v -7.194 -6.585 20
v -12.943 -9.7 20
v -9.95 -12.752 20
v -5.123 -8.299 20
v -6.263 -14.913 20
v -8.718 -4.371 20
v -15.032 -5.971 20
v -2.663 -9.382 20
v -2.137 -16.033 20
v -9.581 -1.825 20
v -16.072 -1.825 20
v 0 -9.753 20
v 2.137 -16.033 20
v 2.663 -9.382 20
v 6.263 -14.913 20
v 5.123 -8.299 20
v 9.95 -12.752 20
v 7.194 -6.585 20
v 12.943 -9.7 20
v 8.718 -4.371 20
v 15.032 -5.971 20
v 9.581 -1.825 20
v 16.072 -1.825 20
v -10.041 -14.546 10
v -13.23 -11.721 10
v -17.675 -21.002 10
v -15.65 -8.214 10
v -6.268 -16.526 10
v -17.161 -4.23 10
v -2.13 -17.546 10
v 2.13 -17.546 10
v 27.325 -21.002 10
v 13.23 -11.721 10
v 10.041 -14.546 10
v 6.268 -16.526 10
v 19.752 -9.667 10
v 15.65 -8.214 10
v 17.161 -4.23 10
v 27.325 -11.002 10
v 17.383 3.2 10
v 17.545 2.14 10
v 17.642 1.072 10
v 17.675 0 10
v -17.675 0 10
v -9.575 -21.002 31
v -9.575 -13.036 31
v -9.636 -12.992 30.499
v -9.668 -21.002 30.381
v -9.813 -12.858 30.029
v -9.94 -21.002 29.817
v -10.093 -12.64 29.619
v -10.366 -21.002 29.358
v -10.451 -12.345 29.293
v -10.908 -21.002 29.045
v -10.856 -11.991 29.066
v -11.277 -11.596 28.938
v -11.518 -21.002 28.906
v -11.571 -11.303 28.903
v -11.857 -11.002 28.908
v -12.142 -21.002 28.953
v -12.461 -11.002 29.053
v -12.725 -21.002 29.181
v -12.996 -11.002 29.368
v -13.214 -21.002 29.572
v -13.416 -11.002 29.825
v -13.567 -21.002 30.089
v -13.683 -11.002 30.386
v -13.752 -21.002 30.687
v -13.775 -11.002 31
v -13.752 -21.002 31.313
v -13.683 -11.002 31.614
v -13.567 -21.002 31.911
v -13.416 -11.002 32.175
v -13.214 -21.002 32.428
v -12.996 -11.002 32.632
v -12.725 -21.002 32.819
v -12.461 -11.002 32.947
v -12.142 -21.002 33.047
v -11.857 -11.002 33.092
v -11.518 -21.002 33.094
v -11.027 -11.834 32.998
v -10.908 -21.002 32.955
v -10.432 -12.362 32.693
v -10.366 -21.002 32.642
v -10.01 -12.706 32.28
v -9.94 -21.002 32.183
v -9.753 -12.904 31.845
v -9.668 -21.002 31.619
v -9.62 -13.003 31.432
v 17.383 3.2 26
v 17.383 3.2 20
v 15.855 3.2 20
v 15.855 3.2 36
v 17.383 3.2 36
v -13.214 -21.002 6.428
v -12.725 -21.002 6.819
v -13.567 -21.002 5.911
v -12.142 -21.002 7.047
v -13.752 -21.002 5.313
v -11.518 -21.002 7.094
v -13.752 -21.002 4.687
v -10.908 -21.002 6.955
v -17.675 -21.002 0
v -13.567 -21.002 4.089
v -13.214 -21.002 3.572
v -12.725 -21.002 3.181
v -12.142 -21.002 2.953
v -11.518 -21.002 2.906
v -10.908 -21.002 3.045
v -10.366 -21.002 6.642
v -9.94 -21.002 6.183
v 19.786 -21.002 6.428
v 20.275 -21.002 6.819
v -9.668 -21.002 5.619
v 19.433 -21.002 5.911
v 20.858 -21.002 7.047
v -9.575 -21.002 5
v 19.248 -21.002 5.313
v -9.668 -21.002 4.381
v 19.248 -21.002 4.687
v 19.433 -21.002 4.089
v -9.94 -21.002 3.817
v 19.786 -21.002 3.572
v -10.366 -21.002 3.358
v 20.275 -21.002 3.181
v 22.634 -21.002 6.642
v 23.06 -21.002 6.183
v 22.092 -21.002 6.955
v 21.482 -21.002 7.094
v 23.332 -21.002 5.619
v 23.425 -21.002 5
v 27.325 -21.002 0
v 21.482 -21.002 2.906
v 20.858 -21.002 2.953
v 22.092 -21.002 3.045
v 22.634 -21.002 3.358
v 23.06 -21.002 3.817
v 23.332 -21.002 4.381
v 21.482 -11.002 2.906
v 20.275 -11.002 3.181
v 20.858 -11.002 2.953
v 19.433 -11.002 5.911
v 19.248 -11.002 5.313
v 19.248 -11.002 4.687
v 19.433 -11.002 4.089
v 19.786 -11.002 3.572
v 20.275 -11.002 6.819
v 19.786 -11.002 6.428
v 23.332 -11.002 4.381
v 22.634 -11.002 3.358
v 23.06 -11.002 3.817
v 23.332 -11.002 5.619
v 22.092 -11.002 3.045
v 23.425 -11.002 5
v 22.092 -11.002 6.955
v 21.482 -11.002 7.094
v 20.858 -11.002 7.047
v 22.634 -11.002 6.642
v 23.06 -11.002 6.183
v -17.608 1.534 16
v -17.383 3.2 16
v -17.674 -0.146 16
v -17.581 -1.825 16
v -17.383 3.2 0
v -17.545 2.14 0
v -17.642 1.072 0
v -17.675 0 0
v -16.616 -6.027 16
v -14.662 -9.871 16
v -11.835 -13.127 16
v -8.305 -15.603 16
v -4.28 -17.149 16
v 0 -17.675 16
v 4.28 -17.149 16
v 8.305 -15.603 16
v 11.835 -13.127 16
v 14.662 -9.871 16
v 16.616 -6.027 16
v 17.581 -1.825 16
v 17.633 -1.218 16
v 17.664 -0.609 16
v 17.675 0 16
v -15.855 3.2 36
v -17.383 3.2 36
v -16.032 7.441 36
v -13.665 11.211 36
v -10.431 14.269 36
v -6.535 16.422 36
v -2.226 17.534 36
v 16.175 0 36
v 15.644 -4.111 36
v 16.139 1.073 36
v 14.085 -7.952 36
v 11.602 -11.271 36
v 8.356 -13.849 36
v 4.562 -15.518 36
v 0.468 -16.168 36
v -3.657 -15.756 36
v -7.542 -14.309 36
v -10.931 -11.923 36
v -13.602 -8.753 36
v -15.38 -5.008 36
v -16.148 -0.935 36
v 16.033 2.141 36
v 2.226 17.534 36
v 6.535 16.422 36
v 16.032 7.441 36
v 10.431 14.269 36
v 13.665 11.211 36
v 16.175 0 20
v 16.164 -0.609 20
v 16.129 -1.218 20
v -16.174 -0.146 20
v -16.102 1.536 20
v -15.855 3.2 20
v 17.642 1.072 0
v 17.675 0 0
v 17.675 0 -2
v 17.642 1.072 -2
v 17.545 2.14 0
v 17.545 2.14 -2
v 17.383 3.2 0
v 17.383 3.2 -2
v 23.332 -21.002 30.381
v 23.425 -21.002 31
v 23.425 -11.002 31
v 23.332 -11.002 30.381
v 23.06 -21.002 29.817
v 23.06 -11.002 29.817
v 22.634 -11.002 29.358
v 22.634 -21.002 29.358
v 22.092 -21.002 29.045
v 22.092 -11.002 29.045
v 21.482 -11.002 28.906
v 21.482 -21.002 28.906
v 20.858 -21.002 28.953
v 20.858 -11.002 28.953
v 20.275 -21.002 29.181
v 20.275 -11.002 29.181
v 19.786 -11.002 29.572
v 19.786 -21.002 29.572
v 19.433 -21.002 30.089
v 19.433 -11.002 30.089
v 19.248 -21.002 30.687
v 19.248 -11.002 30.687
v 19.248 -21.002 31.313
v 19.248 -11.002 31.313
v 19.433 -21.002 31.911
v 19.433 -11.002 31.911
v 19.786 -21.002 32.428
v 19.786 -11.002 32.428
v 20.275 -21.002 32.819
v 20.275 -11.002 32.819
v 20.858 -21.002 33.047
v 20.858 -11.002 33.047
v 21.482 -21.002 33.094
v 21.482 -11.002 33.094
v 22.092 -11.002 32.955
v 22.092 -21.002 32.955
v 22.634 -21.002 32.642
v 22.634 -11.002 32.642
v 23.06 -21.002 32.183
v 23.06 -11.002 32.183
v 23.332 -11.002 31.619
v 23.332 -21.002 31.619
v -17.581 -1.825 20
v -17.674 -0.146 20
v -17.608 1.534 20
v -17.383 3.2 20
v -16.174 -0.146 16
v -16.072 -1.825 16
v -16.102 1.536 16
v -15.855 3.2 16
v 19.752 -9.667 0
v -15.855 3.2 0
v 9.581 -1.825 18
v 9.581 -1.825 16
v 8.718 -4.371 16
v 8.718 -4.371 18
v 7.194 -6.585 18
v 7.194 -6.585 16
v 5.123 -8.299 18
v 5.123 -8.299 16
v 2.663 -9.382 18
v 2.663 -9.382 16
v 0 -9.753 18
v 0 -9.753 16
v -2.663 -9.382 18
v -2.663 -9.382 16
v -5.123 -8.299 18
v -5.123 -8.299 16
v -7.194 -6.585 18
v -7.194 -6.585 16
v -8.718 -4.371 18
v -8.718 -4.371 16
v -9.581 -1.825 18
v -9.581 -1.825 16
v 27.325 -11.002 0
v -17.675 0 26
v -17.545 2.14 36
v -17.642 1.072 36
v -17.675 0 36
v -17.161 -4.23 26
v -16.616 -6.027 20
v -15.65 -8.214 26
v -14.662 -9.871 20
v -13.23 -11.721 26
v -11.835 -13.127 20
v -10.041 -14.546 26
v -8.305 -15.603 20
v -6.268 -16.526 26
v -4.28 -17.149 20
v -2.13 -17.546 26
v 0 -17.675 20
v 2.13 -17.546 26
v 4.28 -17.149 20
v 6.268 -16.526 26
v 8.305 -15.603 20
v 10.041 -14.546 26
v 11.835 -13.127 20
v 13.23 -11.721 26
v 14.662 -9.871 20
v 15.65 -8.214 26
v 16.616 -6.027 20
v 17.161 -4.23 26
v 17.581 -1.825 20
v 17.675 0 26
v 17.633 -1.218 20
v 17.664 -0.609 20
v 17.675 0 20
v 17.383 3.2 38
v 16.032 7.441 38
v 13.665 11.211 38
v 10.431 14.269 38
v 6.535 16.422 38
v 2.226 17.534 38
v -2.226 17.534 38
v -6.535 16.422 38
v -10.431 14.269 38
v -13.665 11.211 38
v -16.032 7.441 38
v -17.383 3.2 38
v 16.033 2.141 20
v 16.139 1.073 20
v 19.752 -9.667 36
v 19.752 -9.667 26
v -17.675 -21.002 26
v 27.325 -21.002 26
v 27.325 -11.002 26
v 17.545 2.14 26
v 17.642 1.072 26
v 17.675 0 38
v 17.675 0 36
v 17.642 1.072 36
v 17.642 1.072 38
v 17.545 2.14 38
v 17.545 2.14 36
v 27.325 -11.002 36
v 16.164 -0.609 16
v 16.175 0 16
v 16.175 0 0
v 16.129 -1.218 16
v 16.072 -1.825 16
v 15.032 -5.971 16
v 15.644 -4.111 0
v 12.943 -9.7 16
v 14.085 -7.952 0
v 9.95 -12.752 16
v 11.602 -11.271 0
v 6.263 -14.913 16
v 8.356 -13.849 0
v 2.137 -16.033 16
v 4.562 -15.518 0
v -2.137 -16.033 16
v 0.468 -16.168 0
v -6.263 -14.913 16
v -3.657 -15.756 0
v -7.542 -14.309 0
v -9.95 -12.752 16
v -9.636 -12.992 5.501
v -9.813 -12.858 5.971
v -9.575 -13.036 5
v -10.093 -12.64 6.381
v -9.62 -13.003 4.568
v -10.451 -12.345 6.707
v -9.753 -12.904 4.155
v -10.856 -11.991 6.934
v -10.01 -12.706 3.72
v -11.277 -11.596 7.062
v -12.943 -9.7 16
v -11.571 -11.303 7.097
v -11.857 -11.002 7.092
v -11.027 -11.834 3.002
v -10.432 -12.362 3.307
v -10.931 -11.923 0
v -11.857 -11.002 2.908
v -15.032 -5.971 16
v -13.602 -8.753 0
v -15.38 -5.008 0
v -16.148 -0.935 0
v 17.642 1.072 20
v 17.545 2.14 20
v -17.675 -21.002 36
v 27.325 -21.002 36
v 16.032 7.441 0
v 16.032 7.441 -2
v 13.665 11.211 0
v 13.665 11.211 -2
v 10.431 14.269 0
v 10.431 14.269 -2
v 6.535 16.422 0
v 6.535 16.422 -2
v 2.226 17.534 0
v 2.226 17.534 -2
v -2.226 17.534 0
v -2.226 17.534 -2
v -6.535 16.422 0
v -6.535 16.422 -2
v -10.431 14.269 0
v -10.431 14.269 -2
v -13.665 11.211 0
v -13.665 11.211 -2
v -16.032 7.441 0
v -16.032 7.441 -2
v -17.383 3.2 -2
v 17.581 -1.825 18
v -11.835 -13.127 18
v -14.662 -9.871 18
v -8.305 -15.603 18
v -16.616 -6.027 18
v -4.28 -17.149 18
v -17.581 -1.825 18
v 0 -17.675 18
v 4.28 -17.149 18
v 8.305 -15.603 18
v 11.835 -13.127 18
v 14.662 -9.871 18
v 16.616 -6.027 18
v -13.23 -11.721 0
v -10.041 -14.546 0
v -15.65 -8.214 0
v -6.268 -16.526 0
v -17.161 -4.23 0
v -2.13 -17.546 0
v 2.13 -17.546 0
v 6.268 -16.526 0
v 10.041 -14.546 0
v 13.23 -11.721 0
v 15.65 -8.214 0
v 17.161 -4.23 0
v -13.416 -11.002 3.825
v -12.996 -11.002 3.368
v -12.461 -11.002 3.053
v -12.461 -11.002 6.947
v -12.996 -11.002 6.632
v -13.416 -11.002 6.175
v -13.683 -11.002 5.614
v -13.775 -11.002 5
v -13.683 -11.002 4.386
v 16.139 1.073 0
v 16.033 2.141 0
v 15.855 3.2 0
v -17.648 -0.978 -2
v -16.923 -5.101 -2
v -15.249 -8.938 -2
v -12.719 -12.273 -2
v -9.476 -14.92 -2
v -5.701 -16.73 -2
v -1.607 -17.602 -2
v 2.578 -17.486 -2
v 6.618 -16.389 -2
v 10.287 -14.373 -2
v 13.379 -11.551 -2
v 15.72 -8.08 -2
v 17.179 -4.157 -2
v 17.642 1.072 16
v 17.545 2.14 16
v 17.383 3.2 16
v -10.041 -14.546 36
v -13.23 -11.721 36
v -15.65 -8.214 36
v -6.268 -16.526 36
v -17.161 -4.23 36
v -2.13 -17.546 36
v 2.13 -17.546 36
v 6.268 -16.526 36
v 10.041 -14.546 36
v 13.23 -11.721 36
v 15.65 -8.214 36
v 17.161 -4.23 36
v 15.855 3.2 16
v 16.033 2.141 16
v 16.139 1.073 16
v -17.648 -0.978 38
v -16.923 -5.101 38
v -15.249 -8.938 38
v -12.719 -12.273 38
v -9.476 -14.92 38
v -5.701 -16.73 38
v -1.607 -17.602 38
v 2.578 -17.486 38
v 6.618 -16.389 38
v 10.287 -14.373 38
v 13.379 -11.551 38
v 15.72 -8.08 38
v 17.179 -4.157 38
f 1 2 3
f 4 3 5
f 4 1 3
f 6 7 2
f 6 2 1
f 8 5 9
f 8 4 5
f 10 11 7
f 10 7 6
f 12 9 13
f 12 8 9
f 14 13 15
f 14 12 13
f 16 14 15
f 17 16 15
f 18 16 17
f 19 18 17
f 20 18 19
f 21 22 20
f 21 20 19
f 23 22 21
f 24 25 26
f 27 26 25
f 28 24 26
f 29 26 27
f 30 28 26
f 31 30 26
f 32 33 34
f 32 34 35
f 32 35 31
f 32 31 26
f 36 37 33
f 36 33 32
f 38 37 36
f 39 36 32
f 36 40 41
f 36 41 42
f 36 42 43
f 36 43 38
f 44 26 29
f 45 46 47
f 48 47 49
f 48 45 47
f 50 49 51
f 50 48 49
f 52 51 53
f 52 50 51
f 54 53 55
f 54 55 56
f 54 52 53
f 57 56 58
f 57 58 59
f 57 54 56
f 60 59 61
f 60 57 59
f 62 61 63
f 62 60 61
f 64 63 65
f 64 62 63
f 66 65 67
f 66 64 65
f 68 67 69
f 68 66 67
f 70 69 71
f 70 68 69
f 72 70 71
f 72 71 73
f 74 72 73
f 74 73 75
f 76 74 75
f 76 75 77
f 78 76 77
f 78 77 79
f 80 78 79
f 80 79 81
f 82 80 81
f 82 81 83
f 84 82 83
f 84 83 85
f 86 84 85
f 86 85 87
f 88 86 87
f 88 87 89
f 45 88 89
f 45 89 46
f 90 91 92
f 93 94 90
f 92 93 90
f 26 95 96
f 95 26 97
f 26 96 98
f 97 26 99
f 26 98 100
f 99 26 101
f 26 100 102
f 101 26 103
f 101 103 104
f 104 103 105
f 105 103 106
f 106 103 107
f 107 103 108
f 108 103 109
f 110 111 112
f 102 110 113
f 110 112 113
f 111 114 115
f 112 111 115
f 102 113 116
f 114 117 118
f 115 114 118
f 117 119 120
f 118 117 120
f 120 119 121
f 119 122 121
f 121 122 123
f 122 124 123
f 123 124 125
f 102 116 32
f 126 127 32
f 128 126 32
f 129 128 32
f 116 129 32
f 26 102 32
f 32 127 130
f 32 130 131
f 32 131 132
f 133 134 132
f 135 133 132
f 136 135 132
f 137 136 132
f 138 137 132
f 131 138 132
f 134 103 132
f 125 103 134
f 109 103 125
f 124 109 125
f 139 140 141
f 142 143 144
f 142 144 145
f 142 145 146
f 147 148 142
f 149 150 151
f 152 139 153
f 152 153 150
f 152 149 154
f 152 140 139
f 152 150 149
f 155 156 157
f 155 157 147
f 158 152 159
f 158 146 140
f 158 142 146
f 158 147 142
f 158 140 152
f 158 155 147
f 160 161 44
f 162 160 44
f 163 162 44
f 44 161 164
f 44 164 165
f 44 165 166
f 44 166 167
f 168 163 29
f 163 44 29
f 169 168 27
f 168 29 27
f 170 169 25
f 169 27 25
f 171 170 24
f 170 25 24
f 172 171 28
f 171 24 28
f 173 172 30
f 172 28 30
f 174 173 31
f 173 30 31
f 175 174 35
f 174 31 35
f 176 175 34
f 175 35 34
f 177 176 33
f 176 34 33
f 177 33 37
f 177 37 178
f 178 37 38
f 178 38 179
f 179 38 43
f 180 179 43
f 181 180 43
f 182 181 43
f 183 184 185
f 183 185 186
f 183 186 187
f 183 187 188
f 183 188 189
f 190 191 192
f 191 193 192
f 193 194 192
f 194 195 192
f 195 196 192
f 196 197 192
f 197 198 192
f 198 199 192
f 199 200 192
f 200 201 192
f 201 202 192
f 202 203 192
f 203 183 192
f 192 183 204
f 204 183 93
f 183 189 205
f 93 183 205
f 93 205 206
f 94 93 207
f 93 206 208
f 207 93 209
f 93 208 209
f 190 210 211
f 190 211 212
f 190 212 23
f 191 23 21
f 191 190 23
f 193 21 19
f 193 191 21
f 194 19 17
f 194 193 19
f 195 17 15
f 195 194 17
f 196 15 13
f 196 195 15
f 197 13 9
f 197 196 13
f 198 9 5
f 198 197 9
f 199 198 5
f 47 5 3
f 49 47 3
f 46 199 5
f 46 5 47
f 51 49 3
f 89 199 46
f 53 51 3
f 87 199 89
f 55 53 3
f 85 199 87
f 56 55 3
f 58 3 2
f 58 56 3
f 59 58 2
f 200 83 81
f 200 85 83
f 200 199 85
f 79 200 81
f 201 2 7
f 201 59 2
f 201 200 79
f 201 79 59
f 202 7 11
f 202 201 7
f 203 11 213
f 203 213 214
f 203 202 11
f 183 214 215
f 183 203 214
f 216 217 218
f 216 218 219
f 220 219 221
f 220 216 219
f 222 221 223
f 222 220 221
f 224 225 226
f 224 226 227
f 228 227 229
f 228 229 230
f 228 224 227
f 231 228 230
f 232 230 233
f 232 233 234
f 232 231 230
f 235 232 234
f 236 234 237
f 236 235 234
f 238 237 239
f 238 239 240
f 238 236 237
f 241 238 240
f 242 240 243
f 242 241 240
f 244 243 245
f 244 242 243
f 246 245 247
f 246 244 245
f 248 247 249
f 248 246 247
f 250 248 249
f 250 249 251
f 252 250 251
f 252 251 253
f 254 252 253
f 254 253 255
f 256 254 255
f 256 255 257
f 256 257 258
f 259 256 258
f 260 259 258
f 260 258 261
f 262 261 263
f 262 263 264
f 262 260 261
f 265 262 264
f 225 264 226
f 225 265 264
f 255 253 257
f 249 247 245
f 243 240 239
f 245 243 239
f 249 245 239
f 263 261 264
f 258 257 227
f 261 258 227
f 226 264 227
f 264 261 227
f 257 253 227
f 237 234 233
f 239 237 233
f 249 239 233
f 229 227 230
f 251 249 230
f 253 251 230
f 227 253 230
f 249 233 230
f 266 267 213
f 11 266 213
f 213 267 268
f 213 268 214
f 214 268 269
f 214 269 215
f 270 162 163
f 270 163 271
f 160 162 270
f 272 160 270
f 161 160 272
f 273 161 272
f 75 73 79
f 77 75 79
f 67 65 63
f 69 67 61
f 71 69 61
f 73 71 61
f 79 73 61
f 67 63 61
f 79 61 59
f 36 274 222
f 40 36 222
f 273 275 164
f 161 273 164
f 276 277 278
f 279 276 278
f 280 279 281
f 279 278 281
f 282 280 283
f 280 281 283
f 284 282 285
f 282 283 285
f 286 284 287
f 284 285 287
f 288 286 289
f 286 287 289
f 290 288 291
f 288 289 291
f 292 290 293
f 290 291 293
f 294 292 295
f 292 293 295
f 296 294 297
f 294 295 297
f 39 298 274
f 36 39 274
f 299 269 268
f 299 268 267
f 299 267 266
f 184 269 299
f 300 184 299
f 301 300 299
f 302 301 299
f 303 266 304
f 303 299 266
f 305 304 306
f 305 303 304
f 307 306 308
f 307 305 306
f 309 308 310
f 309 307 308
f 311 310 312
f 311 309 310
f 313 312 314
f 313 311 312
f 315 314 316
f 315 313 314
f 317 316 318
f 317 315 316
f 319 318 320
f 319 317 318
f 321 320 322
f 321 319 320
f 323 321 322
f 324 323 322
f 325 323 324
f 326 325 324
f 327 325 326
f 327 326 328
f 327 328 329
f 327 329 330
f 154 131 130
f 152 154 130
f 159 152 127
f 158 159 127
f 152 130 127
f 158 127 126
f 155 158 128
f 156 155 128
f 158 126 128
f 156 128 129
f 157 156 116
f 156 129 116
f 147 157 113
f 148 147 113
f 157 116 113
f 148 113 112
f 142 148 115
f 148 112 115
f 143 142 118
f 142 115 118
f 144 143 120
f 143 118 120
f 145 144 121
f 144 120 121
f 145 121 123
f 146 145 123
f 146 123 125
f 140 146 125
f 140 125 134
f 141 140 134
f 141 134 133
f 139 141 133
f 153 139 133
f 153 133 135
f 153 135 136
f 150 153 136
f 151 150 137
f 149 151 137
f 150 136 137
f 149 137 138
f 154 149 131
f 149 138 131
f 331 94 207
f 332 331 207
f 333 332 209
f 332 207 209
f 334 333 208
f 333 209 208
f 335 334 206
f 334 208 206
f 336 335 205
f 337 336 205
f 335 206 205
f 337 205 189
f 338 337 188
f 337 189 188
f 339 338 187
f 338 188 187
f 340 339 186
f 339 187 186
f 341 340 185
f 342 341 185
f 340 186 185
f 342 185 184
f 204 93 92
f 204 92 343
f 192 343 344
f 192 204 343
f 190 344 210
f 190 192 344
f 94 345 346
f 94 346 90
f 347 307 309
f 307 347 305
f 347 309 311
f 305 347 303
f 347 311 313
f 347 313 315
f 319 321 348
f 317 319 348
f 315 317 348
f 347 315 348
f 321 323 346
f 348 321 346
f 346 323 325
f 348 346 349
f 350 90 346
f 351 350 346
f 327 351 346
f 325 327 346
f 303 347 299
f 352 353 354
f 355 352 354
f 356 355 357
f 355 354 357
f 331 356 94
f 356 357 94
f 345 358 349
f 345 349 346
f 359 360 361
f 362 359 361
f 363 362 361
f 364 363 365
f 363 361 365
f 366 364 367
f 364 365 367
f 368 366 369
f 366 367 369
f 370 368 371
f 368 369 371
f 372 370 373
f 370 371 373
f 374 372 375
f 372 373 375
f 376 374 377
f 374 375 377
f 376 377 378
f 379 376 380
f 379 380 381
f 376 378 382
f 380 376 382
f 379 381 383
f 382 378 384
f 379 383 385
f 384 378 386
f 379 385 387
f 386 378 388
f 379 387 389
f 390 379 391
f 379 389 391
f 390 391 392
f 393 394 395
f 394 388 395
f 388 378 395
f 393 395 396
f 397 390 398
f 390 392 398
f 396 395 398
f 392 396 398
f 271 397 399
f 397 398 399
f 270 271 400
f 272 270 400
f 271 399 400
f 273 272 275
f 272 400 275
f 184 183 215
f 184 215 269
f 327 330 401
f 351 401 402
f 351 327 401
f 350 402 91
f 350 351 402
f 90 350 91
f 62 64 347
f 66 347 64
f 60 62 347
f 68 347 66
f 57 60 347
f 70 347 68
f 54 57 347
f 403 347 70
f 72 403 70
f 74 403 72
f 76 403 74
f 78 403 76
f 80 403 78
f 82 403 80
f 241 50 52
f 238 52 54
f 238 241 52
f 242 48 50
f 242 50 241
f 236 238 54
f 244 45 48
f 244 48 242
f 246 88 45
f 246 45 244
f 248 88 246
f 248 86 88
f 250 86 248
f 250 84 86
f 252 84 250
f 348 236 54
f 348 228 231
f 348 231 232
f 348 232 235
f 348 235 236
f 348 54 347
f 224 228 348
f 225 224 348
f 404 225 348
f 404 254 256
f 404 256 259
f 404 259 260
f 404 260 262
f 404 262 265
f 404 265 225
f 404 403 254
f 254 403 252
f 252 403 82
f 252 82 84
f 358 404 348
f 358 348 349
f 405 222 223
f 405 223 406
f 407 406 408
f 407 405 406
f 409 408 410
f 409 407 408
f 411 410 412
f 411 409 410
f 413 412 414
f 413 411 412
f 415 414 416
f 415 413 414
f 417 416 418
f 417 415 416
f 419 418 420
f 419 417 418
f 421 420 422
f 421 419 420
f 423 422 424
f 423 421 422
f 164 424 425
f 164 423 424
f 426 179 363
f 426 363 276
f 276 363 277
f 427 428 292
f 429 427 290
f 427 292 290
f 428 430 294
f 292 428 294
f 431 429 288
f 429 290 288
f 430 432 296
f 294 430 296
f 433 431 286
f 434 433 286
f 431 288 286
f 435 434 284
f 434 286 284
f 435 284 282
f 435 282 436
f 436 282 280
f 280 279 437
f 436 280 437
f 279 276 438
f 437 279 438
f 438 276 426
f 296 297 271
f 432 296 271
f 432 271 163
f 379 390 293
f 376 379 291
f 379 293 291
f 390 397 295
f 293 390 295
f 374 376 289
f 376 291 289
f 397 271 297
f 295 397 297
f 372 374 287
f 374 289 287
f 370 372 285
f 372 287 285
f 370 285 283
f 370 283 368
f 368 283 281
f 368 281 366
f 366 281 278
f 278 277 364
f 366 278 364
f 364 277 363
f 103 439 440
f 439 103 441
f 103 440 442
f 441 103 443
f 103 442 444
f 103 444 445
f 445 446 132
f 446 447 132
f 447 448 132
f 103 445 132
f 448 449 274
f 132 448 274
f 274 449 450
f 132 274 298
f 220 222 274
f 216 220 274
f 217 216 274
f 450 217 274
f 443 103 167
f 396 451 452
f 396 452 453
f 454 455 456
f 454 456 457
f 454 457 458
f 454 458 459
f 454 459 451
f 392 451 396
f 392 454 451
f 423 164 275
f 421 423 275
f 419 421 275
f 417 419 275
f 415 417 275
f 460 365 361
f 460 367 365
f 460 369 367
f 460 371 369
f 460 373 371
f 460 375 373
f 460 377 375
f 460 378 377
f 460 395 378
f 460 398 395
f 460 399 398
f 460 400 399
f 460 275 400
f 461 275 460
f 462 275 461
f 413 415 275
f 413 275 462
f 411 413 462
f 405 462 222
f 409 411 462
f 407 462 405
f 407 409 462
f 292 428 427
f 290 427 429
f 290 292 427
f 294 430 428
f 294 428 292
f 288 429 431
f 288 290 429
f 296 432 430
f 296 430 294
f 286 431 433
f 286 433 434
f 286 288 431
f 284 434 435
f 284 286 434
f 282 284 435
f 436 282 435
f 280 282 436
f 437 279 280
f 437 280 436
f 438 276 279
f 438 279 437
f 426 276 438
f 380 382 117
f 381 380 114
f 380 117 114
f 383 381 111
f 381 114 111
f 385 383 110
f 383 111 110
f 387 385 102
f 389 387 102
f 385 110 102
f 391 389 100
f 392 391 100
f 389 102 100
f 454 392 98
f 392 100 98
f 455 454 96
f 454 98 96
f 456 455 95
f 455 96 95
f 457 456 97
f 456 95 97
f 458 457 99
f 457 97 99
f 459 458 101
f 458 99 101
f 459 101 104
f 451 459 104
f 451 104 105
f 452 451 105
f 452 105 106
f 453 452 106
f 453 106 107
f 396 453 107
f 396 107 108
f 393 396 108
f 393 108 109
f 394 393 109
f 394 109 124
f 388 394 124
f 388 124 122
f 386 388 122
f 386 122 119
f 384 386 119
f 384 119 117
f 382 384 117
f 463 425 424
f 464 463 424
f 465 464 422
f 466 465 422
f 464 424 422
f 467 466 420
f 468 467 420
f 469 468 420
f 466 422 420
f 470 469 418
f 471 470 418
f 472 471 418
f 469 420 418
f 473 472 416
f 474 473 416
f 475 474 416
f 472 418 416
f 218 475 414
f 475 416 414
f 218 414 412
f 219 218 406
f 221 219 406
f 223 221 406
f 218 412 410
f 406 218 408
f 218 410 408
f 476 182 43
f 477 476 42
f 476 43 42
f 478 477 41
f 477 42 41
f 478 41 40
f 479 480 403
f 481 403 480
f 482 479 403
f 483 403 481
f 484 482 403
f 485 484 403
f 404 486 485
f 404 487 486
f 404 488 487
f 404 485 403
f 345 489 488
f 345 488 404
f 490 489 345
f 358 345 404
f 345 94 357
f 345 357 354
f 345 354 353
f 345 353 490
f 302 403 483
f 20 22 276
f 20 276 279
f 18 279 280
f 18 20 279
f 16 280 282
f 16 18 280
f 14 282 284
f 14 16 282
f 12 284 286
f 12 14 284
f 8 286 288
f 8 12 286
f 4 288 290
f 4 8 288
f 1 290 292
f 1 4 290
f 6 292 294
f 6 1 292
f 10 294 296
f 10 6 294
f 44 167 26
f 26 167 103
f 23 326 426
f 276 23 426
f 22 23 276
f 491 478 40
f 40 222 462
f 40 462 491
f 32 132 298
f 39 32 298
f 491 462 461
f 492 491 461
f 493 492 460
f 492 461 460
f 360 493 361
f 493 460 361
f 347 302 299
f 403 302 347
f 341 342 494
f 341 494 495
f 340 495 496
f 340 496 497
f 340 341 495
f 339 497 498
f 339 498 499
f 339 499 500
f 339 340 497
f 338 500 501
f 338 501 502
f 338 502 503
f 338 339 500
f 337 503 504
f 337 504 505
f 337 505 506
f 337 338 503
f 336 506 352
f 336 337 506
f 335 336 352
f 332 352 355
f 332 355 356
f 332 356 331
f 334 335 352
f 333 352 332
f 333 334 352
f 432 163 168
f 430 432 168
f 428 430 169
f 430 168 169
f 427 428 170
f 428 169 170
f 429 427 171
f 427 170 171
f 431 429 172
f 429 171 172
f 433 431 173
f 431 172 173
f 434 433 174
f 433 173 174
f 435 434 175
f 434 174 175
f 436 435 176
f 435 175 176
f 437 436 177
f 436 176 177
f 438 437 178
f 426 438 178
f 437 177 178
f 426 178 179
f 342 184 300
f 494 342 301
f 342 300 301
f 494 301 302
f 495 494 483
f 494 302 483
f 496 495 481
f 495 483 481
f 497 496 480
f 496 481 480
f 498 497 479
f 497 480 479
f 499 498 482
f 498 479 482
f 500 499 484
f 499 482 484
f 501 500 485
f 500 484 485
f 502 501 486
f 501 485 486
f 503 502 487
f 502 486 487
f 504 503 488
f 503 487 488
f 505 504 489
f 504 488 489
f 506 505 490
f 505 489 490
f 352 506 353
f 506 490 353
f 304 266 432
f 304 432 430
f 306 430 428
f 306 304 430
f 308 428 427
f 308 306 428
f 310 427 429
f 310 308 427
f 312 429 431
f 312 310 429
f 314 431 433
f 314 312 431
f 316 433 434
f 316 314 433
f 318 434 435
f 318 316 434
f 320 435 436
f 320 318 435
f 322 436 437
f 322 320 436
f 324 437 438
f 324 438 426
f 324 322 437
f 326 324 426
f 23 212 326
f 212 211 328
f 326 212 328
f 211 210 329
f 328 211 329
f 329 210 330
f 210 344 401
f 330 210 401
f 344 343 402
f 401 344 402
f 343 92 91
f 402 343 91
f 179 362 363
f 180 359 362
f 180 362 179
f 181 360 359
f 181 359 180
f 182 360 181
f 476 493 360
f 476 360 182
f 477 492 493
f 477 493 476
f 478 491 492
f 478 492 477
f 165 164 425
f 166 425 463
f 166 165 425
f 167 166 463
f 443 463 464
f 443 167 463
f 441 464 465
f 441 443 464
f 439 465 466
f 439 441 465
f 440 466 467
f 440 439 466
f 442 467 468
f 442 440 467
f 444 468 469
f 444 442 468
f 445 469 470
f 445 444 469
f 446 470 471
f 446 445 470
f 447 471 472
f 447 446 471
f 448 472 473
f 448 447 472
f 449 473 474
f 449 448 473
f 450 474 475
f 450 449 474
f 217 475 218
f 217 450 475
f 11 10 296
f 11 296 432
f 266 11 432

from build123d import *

# Parameters (mm, degrees)
SKETCH1_R           = 17.675
BOSS_EXTRUDE1_DEPTH = 2
BOSS_EXTRUDE2_START = 16
BOSS_EXTRUDE2_DEPTH = 16
BOSS_EXTRUDE3_START = 2
BOSS_EXTRUDE3_DEPTH = 2
BOSS_EXTRUDE4_START = 10
BOSS_EXTRUDE4_DEPTH = 10
SKETCH5_R           = 2.1
CUT_EXTRUDE3_DEPTH  = 10


with BuildPart() as part:
    # Sketch1 → Boss-Extrude1 (new body)
    with BuildSketch(Plane.XY):
        Circle(SKETCH1_R)
    extrude(amount=-BOSS_EXTRUDE1_DEPTH)

    # Sketch1<4> → Boss-Extrude2 (add)
    with BuildSketch(Plane.XY.offset(BOSS_EXTRUDE2_START)):
        with BuildLine():
            Line((-15.855302741, 3.2), (-17.382911868, 3.2))
            ThreePointArc((-17.382911868, 3.2), (-1.606651446, -17.6018265), (17.675, 0))
            ThreePointArc((17.675, 0), (17.6018265, 1.606651446), (17.382911868, 3.2))
            Line((17.382911868, 3.2), (15.855302741, 3.2))
            ThreePointArc((15.855302741, 3.2), (16.094877241, 1.607965045), (16.175, 0))
            ThreePointArc((16.175, 0), (-1.607965045, -16.094877241), (-15.855302741, 3.2))
        make_face()
    extrude(amount=-BOSS_EXTRUDE2_DEPTH)

    # Sketch2 → Boss-Extrude3 (add)
    with BuildSketch(Plane.XY.offset(16).offset(BOSS_EXTRUDE3_START)):
        with BuildLine():
            ThreePointArc((-17.580529002, -1.825), (0, -17.675), (17.580529002, -1.825))
            Line((17.580529002, -1.825), (9.580529002, -1.825))
            ThreePointArc((9.580529002, -1.825), (0, -9.752802724), (-9.580529002, -1.825))
            Line((-9.580529002, -1.825), (-17.580529002, -1.825))
        make_face()
    extrude(amount=-BOSS_EXTRUDE3_DEPTH)

    # Sketch3 → Boss-Extrude4 (add)
    with BuildSketch(Plane.XY.offset(BOSS_EXTRUDE4_START)):
        with BuildLine():
            Line((-17.675, -21.0022), (27.325, -21.0022))
            Line((27.325, -21.0022), (27.325, -11.0022))
            Line((27.325, -11.0022), (19.751545283, -9.666795596))
            Line((19.751545283, -9.666795596), (17.382911868, 3.2))
            ThreePointArc((17.382911868, 3.2), (1.606651446, -17.6018265), (-17.675, 0))
            Line((-17.675, 0), (-17.675, -21.0022))
        make_face()
    extrude(amount=-BOSS_EXTRUDE4_DEPTH)

    # Sketch5 → Cut-Extrude3 (cut)
    with BuildSketch(Plane.XZ.offset(21.0022)):
        with Locations((-11.675, 5)):
            Circle(SKETCH5_R)
        with Locations((21.325, 5)):
            Circle(SKETCH5_R)
    extrude(amount=-CUT_EXTRUDE3_DEPTH, mode=Mode.SUBTRACT)


with BuildPart() as body_2:
    # Mirror1: mirrored copy
    add(part.part.mirror(Plane.XY.offset(18)))


solid = Compound([part.part, body_2.part])
